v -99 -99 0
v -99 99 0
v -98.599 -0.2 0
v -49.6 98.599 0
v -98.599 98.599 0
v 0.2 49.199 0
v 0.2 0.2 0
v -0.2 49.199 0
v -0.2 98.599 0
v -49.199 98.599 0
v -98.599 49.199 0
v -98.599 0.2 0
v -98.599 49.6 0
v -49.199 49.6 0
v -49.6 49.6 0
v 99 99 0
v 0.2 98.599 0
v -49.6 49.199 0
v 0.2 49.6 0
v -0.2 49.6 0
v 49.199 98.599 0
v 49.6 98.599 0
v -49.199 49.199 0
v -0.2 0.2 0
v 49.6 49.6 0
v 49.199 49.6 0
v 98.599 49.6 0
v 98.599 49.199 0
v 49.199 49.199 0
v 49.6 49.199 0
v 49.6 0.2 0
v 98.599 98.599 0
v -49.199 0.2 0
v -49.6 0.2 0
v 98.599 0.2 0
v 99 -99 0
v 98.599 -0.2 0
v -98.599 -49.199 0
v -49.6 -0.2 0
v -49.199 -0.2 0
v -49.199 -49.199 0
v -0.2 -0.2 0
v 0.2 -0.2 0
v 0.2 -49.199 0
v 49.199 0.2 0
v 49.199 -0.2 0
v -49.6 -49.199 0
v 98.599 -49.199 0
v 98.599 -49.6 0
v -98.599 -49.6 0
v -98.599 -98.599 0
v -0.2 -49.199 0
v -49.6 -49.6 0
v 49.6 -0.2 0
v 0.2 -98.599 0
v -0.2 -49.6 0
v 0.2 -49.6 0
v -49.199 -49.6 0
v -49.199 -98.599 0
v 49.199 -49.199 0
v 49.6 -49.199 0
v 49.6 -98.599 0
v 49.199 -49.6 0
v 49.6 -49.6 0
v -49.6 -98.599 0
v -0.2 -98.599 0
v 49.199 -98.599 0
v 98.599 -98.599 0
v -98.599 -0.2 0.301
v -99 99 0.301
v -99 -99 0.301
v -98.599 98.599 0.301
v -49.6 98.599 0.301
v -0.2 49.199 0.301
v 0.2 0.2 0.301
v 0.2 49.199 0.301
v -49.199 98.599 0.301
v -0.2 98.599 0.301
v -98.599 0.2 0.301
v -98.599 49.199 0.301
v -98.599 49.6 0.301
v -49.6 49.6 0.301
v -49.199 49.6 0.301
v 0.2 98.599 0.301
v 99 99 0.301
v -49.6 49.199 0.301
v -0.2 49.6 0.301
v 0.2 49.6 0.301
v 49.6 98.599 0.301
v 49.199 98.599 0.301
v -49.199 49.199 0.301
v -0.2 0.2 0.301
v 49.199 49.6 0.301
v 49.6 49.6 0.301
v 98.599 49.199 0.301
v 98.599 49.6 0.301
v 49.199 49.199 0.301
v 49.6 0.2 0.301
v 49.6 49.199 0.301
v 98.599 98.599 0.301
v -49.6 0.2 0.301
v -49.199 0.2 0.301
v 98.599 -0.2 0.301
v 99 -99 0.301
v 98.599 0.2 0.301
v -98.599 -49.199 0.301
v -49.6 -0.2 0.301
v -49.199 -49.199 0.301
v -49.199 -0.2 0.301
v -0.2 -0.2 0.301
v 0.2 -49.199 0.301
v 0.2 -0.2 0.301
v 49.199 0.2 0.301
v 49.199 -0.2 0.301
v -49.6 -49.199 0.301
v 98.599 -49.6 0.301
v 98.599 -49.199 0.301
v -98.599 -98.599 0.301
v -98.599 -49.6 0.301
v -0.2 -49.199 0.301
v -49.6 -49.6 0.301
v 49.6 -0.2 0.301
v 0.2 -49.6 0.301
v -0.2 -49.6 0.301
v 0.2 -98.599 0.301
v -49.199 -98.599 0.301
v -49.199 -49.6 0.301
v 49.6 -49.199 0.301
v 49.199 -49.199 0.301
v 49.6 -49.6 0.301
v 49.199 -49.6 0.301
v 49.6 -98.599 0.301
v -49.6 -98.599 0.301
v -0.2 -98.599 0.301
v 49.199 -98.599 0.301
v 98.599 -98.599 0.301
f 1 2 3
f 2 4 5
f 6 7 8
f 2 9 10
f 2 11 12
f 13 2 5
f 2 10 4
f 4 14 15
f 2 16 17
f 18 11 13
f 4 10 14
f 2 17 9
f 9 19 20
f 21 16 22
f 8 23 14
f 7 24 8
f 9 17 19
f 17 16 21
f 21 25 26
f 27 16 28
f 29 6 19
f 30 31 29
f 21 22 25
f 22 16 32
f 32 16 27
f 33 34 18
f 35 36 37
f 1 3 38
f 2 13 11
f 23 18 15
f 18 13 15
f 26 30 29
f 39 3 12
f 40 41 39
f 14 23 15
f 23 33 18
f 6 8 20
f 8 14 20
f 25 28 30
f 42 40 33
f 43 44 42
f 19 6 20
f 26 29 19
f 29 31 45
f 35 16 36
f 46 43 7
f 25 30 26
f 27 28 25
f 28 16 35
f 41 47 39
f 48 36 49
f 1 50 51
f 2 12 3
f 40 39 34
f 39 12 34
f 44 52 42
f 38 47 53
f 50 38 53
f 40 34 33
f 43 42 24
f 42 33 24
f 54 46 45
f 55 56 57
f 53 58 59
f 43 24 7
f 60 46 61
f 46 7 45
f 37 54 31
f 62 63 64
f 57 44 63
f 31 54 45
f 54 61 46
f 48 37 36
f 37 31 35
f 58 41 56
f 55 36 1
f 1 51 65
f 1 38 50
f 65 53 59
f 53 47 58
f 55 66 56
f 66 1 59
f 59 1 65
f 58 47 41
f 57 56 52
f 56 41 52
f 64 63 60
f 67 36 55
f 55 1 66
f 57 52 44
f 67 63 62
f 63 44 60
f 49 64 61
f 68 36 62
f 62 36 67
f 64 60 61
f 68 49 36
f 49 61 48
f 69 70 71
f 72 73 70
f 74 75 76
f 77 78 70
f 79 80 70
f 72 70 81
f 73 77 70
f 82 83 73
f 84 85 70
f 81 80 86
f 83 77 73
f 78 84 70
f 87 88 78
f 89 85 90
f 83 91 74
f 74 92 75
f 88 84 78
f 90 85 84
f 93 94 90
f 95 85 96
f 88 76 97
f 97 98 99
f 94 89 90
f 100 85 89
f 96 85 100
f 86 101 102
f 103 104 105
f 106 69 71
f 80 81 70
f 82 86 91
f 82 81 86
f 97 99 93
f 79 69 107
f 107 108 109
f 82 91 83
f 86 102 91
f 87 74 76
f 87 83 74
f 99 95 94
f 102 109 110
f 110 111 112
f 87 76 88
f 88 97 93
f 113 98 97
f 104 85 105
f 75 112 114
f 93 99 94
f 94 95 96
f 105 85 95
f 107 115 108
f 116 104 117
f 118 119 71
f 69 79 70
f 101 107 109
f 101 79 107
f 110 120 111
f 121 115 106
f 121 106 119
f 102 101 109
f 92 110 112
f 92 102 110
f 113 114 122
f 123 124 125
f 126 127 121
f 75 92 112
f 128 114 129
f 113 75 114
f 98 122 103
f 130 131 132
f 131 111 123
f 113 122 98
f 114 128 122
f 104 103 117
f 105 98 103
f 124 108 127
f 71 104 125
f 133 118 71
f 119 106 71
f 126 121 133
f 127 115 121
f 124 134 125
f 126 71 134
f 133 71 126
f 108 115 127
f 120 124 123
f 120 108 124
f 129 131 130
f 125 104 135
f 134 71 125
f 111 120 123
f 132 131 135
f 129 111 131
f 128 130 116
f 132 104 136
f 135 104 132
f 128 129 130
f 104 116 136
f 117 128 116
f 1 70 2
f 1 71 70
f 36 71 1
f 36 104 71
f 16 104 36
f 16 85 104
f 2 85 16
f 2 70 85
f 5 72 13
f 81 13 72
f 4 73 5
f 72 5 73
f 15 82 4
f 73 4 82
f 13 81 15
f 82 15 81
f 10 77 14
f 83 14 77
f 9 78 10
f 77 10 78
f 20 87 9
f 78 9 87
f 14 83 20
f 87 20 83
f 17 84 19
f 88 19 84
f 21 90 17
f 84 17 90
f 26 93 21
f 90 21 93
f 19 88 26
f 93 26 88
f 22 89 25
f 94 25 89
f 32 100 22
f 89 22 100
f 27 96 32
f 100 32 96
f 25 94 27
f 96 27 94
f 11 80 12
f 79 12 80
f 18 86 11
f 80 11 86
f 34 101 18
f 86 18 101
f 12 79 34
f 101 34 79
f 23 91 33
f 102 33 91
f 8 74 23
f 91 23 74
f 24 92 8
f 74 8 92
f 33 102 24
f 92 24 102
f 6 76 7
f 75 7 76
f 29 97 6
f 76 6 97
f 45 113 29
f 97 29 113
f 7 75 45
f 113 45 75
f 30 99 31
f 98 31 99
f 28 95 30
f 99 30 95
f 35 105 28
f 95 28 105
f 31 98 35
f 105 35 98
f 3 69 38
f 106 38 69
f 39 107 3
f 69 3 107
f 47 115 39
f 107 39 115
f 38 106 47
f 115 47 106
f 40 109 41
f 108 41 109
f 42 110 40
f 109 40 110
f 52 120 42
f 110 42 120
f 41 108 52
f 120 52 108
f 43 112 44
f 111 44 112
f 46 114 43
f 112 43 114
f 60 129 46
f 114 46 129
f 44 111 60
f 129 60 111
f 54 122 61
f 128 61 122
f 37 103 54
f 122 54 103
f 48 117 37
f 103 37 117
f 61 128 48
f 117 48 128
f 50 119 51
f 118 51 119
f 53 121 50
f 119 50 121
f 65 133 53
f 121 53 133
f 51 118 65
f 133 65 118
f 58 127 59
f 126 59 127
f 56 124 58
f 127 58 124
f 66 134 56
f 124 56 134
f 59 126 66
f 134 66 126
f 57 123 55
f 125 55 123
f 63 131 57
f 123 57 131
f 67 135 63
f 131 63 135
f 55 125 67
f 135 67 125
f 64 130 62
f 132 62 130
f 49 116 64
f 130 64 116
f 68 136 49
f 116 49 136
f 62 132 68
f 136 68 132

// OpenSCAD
// Grid bed level pattern
// A 4 x 4 grid of single lines across 90% of a 220 x 220 mm bed.

include <../../src/bedlevelpattern.scad>;

// Parameters
bed_level_pattern_type = "grid";
print_area_width = 220.001;
print_area_depth = 220.001;
line_width = 0.401;
line_height = 0.301;
fill_percentage = 90; // Range: [50:100]
grid_cell_count = 4;
quality_value = 128;

$fn = quality_value;

// Generate the pattern
generate_bed_level_pattern(
  bed_level_pattern_type, print_area_width, print_area_depth, line_width, line_height,
  fill_percentage, grid_cell_count=grid_cell_count
);
